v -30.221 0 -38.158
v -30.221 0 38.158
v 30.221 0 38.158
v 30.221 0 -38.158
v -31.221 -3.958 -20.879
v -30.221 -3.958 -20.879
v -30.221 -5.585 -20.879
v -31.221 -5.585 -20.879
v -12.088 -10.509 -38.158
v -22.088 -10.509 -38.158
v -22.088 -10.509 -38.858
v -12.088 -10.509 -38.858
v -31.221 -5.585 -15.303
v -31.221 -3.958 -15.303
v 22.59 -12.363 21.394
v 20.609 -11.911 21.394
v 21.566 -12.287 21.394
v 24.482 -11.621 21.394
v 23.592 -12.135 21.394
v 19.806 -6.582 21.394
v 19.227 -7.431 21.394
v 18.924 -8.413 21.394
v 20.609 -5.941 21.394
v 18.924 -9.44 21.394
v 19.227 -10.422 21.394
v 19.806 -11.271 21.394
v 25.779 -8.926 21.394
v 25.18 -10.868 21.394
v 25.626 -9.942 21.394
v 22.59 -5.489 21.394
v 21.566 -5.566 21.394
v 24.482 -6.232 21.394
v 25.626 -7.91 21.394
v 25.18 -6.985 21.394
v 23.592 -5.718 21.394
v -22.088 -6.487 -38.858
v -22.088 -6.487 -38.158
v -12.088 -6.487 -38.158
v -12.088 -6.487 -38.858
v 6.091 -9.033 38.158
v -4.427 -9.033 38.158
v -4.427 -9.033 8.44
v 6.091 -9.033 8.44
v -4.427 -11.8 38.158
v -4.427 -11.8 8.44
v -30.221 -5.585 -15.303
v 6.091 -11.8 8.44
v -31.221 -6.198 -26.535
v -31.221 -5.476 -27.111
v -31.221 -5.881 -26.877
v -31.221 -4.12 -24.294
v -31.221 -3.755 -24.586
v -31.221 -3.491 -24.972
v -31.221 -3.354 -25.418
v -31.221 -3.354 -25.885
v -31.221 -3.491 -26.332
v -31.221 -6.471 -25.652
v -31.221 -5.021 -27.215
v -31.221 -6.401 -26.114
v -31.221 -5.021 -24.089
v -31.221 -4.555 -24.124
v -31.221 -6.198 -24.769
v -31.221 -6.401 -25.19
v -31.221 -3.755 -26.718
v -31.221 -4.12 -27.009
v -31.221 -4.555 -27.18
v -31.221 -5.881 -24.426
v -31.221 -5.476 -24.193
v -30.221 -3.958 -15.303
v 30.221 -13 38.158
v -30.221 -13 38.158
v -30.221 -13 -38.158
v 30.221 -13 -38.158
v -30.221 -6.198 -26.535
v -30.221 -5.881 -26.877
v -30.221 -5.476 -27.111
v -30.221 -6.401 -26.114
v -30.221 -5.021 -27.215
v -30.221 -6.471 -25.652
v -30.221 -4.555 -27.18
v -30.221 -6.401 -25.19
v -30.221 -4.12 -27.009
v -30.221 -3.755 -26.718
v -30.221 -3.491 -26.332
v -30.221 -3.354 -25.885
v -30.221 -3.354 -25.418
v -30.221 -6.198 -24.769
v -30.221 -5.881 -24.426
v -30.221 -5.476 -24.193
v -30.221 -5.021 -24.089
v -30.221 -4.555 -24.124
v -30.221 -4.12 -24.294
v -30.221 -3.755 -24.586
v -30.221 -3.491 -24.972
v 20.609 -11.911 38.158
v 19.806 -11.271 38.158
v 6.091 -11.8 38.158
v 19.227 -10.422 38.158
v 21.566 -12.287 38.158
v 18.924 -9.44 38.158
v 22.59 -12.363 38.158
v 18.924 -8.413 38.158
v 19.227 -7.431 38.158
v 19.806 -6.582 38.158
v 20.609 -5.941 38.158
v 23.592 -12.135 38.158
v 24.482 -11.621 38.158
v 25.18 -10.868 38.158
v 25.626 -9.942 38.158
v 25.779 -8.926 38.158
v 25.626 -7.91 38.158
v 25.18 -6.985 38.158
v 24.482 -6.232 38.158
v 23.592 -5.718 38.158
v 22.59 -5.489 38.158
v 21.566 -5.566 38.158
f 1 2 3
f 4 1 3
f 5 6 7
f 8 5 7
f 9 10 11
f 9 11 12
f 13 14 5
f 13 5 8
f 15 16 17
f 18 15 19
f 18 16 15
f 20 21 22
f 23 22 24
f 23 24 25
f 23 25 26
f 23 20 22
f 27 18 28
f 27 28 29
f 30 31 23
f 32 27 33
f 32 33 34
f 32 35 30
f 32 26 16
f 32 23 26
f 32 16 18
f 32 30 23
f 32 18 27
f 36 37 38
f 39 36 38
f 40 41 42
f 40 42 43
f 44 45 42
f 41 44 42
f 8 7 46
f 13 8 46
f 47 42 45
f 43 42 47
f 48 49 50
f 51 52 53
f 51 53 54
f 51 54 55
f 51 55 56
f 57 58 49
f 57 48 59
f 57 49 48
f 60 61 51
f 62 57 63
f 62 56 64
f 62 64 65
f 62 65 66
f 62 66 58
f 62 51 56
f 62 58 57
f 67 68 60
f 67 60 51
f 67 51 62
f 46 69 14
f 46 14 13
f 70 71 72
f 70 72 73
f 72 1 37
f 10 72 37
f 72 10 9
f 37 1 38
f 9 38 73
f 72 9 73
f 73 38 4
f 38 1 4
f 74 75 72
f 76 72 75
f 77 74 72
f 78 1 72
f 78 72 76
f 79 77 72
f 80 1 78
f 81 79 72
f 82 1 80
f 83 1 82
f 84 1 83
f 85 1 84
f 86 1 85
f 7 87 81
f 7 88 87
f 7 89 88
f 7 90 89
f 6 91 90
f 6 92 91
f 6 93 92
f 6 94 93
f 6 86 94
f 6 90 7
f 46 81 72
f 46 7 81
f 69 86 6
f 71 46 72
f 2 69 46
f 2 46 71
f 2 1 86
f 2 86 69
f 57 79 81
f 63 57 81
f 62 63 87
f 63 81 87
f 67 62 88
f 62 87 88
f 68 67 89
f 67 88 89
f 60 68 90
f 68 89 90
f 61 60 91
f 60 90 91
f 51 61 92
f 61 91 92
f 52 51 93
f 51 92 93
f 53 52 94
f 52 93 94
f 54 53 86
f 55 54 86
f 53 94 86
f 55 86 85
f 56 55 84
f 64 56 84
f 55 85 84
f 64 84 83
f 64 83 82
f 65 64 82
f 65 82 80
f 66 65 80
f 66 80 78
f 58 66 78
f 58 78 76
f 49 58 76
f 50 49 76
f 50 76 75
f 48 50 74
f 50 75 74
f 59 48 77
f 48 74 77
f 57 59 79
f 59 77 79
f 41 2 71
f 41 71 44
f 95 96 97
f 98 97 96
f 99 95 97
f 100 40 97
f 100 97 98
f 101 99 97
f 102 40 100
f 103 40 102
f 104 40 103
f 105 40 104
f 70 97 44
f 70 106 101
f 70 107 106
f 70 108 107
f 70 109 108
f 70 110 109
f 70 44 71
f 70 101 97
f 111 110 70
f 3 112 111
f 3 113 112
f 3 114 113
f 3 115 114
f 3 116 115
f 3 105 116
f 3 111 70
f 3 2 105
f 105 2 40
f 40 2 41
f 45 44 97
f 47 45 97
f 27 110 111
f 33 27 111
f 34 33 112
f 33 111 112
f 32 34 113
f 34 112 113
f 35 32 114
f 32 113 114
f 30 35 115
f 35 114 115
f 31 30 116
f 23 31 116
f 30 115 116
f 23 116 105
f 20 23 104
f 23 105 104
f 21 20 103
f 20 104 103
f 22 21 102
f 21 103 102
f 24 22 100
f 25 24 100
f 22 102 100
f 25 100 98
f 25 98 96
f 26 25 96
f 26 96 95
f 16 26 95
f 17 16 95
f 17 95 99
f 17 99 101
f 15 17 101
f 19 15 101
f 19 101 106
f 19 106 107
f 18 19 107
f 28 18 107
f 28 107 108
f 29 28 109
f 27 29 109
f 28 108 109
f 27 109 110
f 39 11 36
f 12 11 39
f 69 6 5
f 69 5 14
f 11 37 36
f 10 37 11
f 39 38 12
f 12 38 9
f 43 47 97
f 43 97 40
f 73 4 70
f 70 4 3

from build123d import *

# Parameters (mm, degrees)
F0_W      = 60.442928
F0_H      = 76.316834
F1_DEPTH  = 13
F2_R      = 4.501425
F3_DEPTH  = 7.874
F4_R      = 3.44672
F5_DEPTH  = 16.764
F6_W      = 10
F6_H      = 4.021608
F7_DEPTH  = 0.7
F8_W      = 12.088504
F8_H      = 2.308511
F9_DEPTH  = 7.874
F10_W     = 10
F10_H     = 2.673487
F11_DEPTH = 8.636
F12_W     = 10.518157
F12_H     = 2.767401
F13_DEPTH = 29.718
F14_R     = 1.567214
F15_DEPTH = 1
F16_W     = 1.627309
F16_H     = 5.575751
F17_DEPTH = 1


with BuildPart() as f1:
    # F0 (on Front) → F1 (new body)
    with BuildSketch(Plane.XZ):
        Rectangle(F0_W, F0_H)
    extrude(amount=F1_DEPTH)

    # F2 (on face) → F3 (cut)
    with BuildSketch(Plane(origin=(0, 0, 0), x_dir=(-1, 0, 0), z_dir=(0, 1, 0))):
        with Locations((-20.47102, 49.871981)):
            Circle(F2_R)
    extrude(amount=F3_DEPTH, mode=Mode.SUBTRACT)

    # F4 (on face) → F5 (cut)
    with BuildSketch(Plane.XY.offset(38.158417)):
        with Locations((22.332672, -8.926389)):
            Circle(F4_R)
    extrude(amount=-F5_DEPTH, mode=Mode.SUBTRACT)

    # F6 (on face) → F7 (join)
    with BuildSketch(Plane(origin=(0, 0, -38.158417), x_dir=(1, 0, 0), z_dir=(0, 0, -1))):
        with Locations((-17.087876, 8.49799)):
            Rectangle(F6_W, F6_H)
    extrude(amount=F7_DEPTH)

    # F8 (on face) → F9 (join)
    with BuildSketch(Plane.XY.offset(38.158417)):
        with Locations((0.475428, -10.475016)):
            Rectangle(F8_W, F8_H)
    extrude(amount=-F9_DEPTH)

    # F10 (on face) → F11 (join)
    with BuildSketch(Plane.XY.offset(38.158417)):
        with Locations((-1.288279, -8.985477)):
            Rectangle(F10_W, F10_H)
    extrude(amount=-F11_DEPTH)

    # F12 (on face) → F13 (cut)
    with BuildSketch(Plane.XY.offset(38.158417)):
        with Locations((0.831678, -10.416227)):
            Rectangle(F12_W, F12_H)
    extrude(amount=-F13_DEPTH, mode=Mode.SUBTRACT)

    # F14 (on face) → F15 (join)
    with BuildSketch(Plane(origin=(-30.221464, 0, 0), x_dir=(0, -1, 0), z_dir=(-1, 0, 0))):
        with Locations((4.903499, -25.651673)):
            Circle(F14_R)
    extrude(amount=F15_DEPTH)

    # F16 (on face) → F17 (join)
    with BuildSketch(Plane(origin=(-30.221464, 0, 0), x_dir=(0, -1, 0), z_dir=(-1, 0, 0))):
        with Locations((4.771643, -18.09097)):
            Rectangle(F16_W, F16_H)
    extrude(amount=F17_DEPTH)


solid = f1.part
